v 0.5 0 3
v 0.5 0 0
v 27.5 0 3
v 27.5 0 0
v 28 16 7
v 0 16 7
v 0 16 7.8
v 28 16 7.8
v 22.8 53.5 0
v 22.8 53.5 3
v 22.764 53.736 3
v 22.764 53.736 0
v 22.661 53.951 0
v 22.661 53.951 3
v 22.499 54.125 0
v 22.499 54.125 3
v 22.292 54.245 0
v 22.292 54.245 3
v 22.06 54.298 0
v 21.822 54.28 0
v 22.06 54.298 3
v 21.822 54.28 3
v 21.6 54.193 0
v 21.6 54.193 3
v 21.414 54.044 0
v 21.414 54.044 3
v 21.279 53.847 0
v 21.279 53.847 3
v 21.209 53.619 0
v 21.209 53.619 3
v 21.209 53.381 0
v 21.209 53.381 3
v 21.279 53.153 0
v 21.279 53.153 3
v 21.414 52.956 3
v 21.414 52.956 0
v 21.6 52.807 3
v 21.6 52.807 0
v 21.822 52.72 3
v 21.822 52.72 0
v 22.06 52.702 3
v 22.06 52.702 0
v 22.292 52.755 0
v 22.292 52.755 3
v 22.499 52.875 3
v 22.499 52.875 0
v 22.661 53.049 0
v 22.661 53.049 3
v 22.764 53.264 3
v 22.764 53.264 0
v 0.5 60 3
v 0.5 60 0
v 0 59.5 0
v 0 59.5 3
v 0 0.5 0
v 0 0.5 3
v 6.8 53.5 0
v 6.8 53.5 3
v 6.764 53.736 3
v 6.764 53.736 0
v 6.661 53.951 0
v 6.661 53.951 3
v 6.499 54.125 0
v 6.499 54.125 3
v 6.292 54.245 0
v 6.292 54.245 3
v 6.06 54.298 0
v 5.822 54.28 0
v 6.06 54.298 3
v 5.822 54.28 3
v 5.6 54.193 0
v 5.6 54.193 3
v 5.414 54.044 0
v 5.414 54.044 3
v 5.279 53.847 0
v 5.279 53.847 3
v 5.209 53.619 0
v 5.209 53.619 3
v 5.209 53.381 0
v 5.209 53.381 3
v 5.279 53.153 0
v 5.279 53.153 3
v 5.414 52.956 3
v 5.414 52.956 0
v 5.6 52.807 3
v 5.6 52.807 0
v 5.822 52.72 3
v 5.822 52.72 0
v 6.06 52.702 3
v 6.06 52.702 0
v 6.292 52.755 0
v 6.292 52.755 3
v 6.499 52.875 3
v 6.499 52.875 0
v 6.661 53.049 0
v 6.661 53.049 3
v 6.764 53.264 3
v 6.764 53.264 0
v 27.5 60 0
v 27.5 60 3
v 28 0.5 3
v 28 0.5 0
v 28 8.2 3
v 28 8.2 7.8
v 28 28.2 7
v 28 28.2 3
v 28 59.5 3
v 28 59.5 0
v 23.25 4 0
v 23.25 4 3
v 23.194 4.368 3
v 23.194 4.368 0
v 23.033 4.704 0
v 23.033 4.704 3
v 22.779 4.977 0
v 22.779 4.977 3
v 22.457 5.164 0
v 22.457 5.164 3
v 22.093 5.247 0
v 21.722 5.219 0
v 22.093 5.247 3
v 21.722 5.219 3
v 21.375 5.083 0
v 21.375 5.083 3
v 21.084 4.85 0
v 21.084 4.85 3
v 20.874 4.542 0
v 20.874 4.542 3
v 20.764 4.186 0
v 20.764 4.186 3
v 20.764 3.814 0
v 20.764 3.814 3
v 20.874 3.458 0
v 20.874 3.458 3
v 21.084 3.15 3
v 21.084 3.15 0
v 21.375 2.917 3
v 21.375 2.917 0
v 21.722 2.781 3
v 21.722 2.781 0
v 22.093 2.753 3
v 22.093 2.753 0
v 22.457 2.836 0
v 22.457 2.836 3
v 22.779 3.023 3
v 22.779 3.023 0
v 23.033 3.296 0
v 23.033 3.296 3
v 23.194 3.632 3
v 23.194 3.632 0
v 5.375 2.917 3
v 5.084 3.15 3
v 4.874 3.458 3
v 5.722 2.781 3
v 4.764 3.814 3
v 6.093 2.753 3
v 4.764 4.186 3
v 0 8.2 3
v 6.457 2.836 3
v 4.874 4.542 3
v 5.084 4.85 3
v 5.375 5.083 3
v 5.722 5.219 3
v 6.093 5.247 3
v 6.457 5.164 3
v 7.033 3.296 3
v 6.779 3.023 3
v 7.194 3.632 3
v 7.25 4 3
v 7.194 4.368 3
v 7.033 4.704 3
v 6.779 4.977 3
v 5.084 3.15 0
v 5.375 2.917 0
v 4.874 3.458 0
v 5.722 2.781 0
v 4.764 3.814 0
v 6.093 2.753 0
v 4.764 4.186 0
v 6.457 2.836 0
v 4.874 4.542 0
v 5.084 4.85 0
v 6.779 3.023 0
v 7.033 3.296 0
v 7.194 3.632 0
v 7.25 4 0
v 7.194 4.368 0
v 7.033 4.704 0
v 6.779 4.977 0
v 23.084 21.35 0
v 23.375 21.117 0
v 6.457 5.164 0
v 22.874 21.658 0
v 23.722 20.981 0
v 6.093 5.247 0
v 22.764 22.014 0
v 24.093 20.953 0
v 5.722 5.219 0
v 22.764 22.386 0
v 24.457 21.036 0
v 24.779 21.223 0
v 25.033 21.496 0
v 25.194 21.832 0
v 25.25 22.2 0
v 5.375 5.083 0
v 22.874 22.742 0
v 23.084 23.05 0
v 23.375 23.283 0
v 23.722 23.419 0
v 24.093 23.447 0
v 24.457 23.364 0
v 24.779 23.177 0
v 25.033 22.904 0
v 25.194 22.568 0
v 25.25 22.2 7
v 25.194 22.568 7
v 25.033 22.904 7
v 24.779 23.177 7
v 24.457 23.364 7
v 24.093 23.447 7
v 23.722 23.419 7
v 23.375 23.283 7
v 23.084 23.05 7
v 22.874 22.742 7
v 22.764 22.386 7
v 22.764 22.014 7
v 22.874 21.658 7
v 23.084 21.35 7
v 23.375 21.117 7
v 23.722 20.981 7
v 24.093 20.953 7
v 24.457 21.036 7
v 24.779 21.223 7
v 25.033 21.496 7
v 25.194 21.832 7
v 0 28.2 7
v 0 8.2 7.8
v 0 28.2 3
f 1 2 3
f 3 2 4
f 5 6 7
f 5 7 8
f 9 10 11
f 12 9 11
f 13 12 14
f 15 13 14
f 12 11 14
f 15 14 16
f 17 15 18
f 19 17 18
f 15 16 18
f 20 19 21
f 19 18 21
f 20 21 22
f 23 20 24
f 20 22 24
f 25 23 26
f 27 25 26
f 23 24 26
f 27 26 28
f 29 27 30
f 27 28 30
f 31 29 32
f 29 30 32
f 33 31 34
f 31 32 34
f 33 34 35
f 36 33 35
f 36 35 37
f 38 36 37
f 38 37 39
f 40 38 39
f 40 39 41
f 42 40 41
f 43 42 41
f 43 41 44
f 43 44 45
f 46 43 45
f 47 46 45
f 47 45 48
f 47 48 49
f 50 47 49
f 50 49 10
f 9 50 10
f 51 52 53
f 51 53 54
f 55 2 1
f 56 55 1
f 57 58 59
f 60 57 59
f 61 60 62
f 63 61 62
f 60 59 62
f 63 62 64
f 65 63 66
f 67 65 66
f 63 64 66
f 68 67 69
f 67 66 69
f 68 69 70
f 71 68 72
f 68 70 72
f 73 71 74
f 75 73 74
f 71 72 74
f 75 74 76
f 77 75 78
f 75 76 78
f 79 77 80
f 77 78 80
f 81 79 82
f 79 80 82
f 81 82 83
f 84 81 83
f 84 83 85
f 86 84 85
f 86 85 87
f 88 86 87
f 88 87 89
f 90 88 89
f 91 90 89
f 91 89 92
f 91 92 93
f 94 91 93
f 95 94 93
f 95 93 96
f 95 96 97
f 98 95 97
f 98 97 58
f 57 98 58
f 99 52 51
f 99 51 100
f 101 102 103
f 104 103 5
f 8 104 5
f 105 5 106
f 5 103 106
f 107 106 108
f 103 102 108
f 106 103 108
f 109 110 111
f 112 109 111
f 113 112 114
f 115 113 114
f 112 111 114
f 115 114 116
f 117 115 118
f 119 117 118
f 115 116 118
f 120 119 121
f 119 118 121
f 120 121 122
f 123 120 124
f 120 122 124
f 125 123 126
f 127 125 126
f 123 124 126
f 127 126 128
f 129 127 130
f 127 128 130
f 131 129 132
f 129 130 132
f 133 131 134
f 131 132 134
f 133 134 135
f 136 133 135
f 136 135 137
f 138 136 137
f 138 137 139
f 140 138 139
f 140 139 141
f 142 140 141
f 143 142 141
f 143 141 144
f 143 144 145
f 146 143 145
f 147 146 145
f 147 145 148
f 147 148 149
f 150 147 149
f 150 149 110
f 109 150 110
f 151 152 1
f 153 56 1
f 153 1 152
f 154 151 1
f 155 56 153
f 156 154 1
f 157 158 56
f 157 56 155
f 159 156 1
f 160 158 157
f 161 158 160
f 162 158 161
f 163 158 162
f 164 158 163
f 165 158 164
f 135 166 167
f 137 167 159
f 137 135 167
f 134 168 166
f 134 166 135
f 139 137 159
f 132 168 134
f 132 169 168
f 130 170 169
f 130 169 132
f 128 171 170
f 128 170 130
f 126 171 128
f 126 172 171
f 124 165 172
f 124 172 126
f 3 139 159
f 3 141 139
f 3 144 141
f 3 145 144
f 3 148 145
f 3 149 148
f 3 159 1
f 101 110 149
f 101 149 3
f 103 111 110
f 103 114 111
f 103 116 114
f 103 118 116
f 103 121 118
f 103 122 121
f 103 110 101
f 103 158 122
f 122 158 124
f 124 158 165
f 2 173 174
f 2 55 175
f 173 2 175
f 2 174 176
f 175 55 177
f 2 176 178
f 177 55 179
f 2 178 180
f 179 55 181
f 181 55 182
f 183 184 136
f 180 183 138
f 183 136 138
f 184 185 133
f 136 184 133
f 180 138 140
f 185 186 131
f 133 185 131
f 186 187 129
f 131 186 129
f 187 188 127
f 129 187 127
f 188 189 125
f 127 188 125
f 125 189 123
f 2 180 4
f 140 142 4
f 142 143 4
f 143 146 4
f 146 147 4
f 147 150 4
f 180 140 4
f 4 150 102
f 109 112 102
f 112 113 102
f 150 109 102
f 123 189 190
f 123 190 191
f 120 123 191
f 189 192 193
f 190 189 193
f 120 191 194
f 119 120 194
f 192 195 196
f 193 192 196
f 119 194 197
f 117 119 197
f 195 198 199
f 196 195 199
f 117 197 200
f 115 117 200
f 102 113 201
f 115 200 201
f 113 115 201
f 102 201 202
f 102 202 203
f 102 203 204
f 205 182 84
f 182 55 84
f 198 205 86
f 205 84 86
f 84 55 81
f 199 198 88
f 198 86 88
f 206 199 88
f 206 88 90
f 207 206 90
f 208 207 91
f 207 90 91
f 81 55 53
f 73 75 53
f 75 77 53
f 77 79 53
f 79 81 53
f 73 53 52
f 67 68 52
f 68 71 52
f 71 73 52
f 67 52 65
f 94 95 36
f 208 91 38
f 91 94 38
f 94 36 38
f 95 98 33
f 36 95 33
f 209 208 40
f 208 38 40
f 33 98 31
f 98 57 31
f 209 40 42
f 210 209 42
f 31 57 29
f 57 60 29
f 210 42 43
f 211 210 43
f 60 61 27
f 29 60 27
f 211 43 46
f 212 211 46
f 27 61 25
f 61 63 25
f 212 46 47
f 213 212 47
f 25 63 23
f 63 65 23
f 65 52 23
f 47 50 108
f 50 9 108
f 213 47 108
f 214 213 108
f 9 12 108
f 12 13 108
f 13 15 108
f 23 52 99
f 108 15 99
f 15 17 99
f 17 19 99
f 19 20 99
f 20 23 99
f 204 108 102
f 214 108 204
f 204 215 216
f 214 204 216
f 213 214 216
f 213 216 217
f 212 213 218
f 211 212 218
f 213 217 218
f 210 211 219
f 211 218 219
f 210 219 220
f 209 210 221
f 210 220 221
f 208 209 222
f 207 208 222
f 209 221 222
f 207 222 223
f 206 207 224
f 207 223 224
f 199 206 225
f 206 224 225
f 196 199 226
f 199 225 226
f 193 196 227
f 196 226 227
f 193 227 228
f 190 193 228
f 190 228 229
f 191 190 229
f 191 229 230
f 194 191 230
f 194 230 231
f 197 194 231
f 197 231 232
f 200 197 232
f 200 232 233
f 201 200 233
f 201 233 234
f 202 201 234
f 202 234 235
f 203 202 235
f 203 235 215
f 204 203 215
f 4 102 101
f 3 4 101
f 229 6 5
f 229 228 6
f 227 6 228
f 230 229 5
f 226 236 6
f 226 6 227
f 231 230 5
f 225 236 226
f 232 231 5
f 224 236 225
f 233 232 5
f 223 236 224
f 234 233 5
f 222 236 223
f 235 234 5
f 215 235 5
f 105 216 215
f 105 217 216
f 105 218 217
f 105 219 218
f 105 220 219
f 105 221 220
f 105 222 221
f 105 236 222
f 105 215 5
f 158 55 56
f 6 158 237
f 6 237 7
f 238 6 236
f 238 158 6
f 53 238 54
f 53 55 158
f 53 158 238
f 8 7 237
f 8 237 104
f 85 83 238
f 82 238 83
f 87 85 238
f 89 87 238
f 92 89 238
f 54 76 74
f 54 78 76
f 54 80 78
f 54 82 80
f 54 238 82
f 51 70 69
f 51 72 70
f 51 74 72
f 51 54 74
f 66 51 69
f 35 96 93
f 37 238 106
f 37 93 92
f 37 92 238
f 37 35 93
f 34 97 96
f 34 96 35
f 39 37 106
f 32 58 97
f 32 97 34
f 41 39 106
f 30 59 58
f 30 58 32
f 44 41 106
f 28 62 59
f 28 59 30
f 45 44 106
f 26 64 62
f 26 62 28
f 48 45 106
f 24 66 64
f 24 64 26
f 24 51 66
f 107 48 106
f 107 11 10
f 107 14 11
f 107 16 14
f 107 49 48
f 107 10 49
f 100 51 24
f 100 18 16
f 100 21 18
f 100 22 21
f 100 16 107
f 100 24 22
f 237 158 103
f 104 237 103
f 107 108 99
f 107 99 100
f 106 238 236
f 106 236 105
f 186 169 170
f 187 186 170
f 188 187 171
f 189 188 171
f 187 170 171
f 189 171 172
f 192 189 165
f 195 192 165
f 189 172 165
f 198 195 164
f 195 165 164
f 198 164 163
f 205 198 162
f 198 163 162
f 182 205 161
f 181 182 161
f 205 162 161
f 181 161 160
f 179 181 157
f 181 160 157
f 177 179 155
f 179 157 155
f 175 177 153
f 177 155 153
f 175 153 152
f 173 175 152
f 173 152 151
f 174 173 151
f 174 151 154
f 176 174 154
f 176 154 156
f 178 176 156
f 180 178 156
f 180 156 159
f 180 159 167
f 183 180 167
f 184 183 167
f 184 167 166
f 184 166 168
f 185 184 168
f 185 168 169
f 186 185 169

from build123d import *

# Parameters (mm, degrees)
F0_W      = 28
F0_H      = 60
F4_DEPTH  = 3
F2_W      = 28
F2_H      = 7.8
F5_DEPTH  = 7.8
F3_W      = 28
F3_H      = 12.2
F6_DEPTH  = 7
F7_R      = 0.8
F8_DEPTH  = 25
F9_R      = 0.8
F10_DEPTH = 25
F11_R     = 1.25
F13_DEPTH = 25
F12_R     = 1.25
F14_DEPTH = 25
F15_SIZE  = 0.5
F16_R     = 1.25
F17_DEPTH = 25


with BuildPart() as f4:
    # F0 (on Top) → F4 (new body)
    with BuildSketch(Plane.XY):
        with Locations((14, 30)):
            Rectangle(F0_W, F0_H)
    extrude(amount=F4_DEPTH)

    # F2 (on face) → F5 (join)
    with BuildSketch(Plane.XY):
        with Locations((14, 12.1)):
            Rectangle(F2_W, F2_H)
    extrude(amount=F5_DEPTH)

    # F3 (on face) → F6 (join)
    with BuildSketch(Plane.XY):
        with Locations((14, 22.1)):
            Rectangle(F3_W, F3_H)
    extrude(amount=F6_DEPTH)

    # F7 (on face) → F8 (cut)
    with BuildSketch(Plane.XY.offset(3)):
        with Locations((6, 53.5)):
            Circle(F7_R)
    extrude(amount=-F8_DEPTH, mode=Mode.SUBTRACT)

    # F9 (on face) → F10 (cut)
    with BuildSketch(Plane.XY.offset(3)):
        with Locations((22, 53.5)):
            Circle(F9_R)
    extrude(amount=-F10_DEPTH, mode=Mode.SUBTRACT)

    # F11 (on face) → F13 (cut)
    with BuildSketch(Plane.XY.offset(3)):
        with Locations((6, 4)):
            Circle(F11_R)
    extrude(amount=-F13_DEPTH, mode=Mode.SUBTRACT)

    # F12 (on face) → F14 (cut)
    with BuildSketch(Plane.XY.offset(3)):
        with Locations((22, 4)):
            Circle(F12_R)
    extrude(amount=-F14_DEPTH, mode=Mode.SUBTRACT)

    # F15
    f15_edges = [f4.edges().sort_by_distance(p)[0] for p in [
        (28, 0, 1.5),
        (0, 0, 1.5),
        (0, 60, 1.5),
        (28, 60, 1.5),
    ]]
    chamfer(f15_edges, length=F15_SIZE)

    # F16 (on face) → F17 (cut)
    with BuildSketch(Plane.XY.offset(7)):
        with Locations((24, 22.2)):
            Circle(F16_R)
    extrude(amount=-F17_DEPTH, mode=Mode.SUBTRACT)


solid = f4.part
